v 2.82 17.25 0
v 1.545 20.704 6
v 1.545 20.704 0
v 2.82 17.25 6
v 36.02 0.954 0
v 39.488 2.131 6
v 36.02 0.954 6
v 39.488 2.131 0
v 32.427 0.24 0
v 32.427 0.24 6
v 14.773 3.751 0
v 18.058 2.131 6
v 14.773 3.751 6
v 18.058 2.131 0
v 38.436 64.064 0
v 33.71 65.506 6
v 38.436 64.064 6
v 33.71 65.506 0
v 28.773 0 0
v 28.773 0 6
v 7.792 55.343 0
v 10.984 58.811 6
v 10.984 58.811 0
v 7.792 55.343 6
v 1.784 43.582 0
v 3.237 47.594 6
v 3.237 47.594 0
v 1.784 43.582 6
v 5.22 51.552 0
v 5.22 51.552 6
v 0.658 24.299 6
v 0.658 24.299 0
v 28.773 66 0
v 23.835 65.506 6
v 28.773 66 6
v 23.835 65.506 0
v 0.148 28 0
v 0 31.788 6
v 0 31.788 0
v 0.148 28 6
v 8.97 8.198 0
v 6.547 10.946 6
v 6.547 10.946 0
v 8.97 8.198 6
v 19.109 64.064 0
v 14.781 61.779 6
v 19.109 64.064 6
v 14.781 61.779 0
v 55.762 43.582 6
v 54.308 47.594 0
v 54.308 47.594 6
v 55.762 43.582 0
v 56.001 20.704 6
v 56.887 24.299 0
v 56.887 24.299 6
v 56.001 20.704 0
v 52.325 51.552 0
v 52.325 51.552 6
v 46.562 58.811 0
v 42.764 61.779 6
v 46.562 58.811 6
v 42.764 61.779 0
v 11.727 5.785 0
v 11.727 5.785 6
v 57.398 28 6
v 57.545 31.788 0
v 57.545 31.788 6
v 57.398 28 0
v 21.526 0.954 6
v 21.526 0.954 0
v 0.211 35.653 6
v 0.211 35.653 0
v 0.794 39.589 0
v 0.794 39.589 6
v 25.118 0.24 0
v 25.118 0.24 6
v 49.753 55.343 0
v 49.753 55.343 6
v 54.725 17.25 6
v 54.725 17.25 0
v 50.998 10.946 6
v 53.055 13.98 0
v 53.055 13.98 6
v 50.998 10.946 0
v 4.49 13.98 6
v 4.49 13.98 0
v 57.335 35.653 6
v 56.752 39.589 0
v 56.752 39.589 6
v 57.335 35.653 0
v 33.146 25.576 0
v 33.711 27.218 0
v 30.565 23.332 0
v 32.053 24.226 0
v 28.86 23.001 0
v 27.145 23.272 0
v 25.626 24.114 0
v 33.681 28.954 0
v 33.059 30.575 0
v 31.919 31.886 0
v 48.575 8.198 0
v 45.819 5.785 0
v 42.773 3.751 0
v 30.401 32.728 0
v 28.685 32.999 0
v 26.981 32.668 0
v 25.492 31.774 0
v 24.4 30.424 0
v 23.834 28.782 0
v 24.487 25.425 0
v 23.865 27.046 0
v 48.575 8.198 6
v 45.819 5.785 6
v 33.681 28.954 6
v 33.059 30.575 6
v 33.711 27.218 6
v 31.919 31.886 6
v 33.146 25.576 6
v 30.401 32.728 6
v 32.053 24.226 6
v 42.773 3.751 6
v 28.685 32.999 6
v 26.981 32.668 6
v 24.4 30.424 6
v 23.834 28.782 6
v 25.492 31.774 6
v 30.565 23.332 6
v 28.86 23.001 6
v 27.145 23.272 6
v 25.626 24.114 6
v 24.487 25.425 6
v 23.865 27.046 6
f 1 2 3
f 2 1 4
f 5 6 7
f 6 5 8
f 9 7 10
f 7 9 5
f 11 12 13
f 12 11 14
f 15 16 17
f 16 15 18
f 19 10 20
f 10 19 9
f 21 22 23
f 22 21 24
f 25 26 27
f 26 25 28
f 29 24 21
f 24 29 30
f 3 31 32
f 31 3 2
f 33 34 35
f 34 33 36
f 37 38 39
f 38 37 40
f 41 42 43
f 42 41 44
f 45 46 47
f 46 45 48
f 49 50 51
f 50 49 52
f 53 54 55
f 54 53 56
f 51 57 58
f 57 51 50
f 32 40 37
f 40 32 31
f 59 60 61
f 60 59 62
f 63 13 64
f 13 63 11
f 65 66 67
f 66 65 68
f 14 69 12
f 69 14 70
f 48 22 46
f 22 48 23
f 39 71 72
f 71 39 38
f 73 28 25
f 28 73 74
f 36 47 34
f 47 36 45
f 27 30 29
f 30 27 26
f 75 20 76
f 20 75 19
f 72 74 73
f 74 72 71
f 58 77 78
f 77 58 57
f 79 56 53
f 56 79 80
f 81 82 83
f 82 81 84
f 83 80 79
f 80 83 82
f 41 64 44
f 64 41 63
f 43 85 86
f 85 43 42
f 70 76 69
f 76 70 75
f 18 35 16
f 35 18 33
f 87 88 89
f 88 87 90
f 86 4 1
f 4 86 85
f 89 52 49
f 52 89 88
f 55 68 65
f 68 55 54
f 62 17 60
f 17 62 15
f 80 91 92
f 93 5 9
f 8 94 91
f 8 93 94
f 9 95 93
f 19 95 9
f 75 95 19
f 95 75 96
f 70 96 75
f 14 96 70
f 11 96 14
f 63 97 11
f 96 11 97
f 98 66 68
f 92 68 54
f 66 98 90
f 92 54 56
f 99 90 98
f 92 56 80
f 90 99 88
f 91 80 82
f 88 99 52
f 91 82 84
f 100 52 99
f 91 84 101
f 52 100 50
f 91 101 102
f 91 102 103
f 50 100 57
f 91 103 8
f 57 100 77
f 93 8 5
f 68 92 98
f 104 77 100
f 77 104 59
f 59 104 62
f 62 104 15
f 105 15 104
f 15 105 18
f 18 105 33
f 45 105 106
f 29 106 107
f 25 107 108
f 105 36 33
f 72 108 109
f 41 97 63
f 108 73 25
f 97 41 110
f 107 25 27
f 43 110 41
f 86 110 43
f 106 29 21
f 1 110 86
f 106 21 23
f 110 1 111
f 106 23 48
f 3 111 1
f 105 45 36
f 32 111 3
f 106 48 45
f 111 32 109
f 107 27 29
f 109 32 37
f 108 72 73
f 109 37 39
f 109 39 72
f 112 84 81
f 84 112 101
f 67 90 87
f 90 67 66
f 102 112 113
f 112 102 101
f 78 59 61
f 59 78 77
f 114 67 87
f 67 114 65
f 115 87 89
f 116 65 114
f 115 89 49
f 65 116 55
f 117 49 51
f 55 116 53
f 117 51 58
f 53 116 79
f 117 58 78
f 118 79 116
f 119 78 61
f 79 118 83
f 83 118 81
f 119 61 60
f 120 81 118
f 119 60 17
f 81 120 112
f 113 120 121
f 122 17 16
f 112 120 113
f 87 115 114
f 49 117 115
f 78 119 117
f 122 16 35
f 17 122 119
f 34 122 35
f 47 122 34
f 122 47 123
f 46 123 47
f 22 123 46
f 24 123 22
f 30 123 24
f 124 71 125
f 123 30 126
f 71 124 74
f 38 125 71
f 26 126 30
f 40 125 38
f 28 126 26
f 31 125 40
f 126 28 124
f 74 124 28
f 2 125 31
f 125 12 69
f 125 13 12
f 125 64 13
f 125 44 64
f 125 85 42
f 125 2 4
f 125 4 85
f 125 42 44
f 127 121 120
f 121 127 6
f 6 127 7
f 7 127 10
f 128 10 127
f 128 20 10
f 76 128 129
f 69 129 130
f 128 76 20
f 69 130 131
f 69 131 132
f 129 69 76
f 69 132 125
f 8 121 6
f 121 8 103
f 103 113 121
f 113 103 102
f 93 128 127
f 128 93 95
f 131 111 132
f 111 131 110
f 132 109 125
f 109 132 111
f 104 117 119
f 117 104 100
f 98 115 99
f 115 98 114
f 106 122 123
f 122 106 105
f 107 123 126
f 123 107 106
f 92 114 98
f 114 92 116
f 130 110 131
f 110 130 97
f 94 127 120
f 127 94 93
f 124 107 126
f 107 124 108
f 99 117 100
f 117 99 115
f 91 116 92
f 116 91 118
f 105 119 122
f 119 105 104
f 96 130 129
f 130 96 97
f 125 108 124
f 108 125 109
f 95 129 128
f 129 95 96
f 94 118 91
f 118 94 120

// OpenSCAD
$fn = 32;

// ----------------------------------------------------------------------
// Cam plate: single_lobe cam, base R28
// ----------------------------------------------------------------------

// --- parameters (mm) ---
base_r = 28;              // base circle radius
lobe_h = 10;              // cam lobe rise
bore_r = 5;               // shaft bore radius
plate_t = 6;              // plate thickness, Z (extrusion height)

profile = [[57.398, 28], [57.545, 31.788], [57.335, 35.653], [56.752, 39.589], [55.762, 43.582], [54.308, 47.594], [52.325, 51.552], [49.753, 55.343], [46.562, 58.811], [42.764, 61.779], [38.436, 64.064], [33.71, 65.506], [28.773, 66], [23.835, 65.506], [19.109, 64.064], [14.781, 61.779], [10.984, 58.811], [7.792, 55.343], [5.22, 51.552], [3.237, 47.594], [1.784, 43.582], [0.794, 39.589], [0.211, 35.653], [0, 31.788], [0.148, 28], [0.658, 24.299], [1.545, 20.704], [2.82, 17.25], [4.49, 13.98], [6.547, 10.946], [8.97, 8.198], [11.727, 5.785], [14.773, 3.751], [18.058, 2.131], [21.526, 0.954], [25.118, 0.24], [28.773, 0], [32.427, 0.24], [36.02, 0.954], [39.488, 2.131], [42.773, 3.751], [45.819, 5.785], [48.575, 8.198], [50.998, 10.946], [53.055, 13.98], [54.725, 17.25], [56.001, 20.704], [56.887, 24.299]];  // primary outline, 48 points, counter clockwise
void_1 = [[33.681, 28.954], [33.059, 30.575], [31.919, 31.886], [30.401, 32.728], [28.685, 32.999], [26.981, 32.668], [25.492, 31.774], [24.4, 30.424], [23.834, 28.782], [23.865, 27.046], [24.487, 25.425], [25.626, 24.114], [27.145, 23.272], [28.86, 23.001], [30.565, 23.332], [32.053, 24.226], [33.146, 25.576], [33.711, 27.218]];  // shaft bore, 18 points

// --- the one profile operation ---
difference() {
  linear_extrude(height = plate_t) polygon(points = profile);
  translate([0, 0, -1])
    linear_extrude(height = plate_t + 2) polygon(points = void_1);
}
